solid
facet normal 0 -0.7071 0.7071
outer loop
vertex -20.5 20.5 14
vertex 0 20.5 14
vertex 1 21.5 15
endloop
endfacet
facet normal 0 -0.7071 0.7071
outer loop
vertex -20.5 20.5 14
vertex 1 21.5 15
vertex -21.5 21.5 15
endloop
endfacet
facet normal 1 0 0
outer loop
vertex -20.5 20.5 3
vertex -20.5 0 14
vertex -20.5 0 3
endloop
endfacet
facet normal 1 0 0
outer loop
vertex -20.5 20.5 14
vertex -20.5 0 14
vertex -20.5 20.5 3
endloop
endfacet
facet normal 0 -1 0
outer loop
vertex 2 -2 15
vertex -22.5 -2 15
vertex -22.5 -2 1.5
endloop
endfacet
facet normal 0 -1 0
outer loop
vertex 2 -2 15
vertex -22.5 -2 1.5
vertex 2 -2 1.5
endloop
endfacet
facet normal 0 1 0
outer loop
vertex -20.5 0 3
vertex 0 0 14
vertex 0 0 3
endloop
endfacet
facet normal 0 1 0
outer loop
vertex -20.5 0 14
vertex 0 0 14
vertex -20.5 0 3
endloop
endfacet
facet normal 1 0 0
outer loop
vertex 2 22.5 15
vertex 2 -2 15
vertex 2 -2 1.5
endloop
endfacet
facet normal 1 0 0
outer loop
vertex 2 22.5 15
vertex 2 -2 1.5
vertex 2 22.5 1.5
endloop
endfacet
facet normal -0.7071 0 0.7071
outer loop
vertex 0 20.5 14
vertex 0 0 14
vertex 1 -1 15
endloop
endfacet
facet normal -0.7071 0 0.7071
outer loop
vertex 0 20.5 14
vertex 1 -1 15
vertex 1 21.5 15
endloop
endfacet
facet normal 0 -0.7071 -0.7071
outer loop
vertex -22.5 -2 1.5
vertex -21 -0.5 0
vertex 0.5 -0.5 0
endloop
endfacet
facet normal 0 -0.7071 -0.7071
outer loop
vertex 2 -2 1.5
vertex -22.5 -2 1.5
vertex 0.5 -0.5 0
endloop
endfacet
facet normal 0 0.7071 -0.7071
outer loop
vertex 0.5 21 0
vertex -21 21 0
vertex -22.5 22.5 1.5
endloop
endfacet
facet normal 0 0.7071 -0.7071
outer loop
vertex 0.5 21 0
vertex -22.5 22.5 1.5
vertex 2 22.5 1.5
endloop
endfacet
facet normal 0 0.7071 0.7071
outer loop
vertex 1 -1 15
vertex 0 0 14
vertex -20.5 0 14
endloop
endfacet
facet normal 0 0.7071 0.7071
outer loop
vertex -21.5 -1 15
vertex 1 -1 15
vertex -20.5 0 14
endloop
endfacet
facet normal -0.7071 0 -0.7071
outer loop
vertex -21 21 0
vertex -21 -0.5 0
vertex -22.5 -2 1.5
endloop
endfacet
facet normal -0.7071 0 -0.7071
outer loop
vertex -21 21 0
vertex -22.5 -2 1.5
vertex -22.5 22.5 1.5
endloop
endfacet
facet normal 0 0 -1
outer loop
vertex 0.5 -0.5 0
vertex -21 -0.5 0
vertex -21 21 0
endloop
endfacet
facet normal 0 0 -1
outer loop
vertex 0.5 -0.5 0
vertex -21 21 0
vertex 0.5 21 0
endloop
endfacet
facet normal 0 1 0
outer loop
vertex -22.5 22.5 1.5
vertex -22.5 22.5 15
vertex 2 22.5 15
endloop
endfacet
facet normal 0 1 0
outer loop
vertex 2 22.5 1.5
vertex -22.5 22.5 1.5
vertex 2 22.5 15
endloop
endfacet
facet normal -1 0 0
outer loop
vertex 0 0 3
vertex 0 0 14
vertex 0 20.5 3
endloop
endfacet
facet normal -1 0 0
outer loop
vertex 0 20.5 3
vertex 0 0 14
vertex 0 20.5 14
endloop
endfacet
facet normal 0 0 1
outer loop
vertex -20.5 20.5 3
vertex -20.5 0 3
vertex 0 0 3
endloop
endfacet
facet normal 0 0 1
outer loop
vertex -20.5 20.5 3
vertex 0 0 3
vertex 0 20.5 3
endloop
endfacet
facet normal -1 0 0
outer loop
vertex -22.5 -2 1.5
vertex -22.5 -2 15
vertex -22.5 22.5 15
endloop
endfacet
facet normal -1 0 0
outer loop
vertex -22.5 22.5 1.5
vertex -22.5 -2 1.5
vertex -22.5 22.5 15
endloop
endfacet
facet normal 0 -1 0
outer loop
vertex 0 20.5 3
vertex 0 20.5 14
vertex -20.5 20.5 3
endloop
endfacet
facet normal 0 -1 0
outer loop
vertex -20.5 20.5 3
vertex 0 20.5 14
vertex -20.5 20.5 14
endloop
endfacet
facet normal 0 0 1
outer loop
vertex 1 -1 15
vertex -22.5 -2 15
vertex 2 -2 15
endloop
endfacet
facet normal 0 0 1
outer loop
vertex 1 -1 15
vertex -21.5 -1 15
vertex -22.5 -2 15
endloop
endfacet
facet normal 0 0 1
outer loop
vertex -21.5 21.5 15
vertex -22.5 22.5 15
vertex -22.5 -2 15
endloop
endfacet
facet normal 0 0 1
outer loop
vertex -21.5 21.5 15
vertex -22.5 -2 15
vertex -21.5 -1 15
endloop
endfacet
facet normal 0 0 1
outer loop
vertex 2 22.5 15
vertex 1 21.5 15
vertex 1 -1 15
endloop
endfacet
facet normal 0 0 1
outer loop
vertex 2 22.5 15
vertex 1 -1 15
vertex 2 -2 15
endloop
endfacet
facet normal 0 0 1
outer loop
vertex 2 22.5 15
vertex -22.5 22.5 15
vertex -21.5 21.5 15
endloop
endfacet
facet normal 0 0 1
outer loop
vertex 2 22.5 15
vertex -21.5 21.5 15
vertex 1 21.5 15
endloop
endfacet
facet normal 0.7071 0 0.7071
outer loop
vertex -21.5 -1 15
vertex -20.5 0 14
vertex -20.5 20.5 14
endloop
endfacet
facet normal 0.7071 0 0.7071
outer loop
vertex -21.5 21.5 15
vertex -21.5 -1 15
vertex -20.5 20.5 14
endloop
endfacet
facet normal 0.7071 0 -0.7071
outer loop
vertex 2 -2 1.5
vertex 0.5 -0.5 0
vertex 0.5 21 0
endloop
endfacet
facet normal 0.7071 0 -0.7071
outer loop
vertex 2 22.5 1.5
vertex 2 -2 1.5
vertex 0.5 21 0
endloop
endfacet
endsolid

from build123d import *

# Parameters (mm, degrees)
SKETCH_W        = 20.5
SKETCH_H        = 20.5
PAD_DEPTH       = 15
SKETCH001_W     = 24.5
SKETCH001_H     = 24.5
PAD001_DEPTH    = 15
PAD001_FACE7_W  = 20.5
PAD001_FACE7_H  = 20.5
POCKET_DEPTH    = 12
CHAMFER_SIZE    = 1
CHAMFER001_SIZE = 1.5


with BuildPart() as part:
    # Sketch → Pad (new body)
    with BuildSketch(Plane.XY):
        with Locations((-10.25, 10.25)):
            Rectangle(SKETCH_W, SKETCH_H)
    extrude(amount=PAD_DEPTH)

    # Sketch001 (on Face6 of Pad) → Pad001 (join)
    with BuildSketch(Plane.XY.offset(15)):
        with Locations((-10.25, 10.25)):
            Rectangle(SKETCH001_W, SKETCH001_H)
    extrude(amount=-PAD001_DEPTH)

    # Pad001 Face7 → Pocket (cut)
    with BuildSketch(Plane(origin=(-10.25, 10.25, 15), x_dir=(0, 1, 0), z_dir=(0, 0, 1))):
        Rectangle(PAD001_FACE7_W, PAD001_FACE7_H)
    extrude(amount=-POCKET_DEPTH, mode=Mode.SUBTRACT)

    # Chamfer
    chamfer_edges = [part.edges().sort_by_distance(p)[0] for p in [
        (-20.5, 10.25, 15),
        (-10.25, 20.5, 15),
        (0, 10.25, 15),
        (-10.25, 0, 15),
    ]]
    chamfer(chamfer_edges, length=CHAMFER_SIZE)

    # Chamfer001
    chamfer001_edges = [part.edges().sort_by_distance(p)[0] for p in [
        (-10.25, 22.5, 0),
        (-22.5, 10.25, 0),
        (-10.25, -2, 0),
        (2, 10.25, 0),
    ]]
    chamfer(chamfer001_edges, length=CHAMFER001_SIZE)


solid = part.part
